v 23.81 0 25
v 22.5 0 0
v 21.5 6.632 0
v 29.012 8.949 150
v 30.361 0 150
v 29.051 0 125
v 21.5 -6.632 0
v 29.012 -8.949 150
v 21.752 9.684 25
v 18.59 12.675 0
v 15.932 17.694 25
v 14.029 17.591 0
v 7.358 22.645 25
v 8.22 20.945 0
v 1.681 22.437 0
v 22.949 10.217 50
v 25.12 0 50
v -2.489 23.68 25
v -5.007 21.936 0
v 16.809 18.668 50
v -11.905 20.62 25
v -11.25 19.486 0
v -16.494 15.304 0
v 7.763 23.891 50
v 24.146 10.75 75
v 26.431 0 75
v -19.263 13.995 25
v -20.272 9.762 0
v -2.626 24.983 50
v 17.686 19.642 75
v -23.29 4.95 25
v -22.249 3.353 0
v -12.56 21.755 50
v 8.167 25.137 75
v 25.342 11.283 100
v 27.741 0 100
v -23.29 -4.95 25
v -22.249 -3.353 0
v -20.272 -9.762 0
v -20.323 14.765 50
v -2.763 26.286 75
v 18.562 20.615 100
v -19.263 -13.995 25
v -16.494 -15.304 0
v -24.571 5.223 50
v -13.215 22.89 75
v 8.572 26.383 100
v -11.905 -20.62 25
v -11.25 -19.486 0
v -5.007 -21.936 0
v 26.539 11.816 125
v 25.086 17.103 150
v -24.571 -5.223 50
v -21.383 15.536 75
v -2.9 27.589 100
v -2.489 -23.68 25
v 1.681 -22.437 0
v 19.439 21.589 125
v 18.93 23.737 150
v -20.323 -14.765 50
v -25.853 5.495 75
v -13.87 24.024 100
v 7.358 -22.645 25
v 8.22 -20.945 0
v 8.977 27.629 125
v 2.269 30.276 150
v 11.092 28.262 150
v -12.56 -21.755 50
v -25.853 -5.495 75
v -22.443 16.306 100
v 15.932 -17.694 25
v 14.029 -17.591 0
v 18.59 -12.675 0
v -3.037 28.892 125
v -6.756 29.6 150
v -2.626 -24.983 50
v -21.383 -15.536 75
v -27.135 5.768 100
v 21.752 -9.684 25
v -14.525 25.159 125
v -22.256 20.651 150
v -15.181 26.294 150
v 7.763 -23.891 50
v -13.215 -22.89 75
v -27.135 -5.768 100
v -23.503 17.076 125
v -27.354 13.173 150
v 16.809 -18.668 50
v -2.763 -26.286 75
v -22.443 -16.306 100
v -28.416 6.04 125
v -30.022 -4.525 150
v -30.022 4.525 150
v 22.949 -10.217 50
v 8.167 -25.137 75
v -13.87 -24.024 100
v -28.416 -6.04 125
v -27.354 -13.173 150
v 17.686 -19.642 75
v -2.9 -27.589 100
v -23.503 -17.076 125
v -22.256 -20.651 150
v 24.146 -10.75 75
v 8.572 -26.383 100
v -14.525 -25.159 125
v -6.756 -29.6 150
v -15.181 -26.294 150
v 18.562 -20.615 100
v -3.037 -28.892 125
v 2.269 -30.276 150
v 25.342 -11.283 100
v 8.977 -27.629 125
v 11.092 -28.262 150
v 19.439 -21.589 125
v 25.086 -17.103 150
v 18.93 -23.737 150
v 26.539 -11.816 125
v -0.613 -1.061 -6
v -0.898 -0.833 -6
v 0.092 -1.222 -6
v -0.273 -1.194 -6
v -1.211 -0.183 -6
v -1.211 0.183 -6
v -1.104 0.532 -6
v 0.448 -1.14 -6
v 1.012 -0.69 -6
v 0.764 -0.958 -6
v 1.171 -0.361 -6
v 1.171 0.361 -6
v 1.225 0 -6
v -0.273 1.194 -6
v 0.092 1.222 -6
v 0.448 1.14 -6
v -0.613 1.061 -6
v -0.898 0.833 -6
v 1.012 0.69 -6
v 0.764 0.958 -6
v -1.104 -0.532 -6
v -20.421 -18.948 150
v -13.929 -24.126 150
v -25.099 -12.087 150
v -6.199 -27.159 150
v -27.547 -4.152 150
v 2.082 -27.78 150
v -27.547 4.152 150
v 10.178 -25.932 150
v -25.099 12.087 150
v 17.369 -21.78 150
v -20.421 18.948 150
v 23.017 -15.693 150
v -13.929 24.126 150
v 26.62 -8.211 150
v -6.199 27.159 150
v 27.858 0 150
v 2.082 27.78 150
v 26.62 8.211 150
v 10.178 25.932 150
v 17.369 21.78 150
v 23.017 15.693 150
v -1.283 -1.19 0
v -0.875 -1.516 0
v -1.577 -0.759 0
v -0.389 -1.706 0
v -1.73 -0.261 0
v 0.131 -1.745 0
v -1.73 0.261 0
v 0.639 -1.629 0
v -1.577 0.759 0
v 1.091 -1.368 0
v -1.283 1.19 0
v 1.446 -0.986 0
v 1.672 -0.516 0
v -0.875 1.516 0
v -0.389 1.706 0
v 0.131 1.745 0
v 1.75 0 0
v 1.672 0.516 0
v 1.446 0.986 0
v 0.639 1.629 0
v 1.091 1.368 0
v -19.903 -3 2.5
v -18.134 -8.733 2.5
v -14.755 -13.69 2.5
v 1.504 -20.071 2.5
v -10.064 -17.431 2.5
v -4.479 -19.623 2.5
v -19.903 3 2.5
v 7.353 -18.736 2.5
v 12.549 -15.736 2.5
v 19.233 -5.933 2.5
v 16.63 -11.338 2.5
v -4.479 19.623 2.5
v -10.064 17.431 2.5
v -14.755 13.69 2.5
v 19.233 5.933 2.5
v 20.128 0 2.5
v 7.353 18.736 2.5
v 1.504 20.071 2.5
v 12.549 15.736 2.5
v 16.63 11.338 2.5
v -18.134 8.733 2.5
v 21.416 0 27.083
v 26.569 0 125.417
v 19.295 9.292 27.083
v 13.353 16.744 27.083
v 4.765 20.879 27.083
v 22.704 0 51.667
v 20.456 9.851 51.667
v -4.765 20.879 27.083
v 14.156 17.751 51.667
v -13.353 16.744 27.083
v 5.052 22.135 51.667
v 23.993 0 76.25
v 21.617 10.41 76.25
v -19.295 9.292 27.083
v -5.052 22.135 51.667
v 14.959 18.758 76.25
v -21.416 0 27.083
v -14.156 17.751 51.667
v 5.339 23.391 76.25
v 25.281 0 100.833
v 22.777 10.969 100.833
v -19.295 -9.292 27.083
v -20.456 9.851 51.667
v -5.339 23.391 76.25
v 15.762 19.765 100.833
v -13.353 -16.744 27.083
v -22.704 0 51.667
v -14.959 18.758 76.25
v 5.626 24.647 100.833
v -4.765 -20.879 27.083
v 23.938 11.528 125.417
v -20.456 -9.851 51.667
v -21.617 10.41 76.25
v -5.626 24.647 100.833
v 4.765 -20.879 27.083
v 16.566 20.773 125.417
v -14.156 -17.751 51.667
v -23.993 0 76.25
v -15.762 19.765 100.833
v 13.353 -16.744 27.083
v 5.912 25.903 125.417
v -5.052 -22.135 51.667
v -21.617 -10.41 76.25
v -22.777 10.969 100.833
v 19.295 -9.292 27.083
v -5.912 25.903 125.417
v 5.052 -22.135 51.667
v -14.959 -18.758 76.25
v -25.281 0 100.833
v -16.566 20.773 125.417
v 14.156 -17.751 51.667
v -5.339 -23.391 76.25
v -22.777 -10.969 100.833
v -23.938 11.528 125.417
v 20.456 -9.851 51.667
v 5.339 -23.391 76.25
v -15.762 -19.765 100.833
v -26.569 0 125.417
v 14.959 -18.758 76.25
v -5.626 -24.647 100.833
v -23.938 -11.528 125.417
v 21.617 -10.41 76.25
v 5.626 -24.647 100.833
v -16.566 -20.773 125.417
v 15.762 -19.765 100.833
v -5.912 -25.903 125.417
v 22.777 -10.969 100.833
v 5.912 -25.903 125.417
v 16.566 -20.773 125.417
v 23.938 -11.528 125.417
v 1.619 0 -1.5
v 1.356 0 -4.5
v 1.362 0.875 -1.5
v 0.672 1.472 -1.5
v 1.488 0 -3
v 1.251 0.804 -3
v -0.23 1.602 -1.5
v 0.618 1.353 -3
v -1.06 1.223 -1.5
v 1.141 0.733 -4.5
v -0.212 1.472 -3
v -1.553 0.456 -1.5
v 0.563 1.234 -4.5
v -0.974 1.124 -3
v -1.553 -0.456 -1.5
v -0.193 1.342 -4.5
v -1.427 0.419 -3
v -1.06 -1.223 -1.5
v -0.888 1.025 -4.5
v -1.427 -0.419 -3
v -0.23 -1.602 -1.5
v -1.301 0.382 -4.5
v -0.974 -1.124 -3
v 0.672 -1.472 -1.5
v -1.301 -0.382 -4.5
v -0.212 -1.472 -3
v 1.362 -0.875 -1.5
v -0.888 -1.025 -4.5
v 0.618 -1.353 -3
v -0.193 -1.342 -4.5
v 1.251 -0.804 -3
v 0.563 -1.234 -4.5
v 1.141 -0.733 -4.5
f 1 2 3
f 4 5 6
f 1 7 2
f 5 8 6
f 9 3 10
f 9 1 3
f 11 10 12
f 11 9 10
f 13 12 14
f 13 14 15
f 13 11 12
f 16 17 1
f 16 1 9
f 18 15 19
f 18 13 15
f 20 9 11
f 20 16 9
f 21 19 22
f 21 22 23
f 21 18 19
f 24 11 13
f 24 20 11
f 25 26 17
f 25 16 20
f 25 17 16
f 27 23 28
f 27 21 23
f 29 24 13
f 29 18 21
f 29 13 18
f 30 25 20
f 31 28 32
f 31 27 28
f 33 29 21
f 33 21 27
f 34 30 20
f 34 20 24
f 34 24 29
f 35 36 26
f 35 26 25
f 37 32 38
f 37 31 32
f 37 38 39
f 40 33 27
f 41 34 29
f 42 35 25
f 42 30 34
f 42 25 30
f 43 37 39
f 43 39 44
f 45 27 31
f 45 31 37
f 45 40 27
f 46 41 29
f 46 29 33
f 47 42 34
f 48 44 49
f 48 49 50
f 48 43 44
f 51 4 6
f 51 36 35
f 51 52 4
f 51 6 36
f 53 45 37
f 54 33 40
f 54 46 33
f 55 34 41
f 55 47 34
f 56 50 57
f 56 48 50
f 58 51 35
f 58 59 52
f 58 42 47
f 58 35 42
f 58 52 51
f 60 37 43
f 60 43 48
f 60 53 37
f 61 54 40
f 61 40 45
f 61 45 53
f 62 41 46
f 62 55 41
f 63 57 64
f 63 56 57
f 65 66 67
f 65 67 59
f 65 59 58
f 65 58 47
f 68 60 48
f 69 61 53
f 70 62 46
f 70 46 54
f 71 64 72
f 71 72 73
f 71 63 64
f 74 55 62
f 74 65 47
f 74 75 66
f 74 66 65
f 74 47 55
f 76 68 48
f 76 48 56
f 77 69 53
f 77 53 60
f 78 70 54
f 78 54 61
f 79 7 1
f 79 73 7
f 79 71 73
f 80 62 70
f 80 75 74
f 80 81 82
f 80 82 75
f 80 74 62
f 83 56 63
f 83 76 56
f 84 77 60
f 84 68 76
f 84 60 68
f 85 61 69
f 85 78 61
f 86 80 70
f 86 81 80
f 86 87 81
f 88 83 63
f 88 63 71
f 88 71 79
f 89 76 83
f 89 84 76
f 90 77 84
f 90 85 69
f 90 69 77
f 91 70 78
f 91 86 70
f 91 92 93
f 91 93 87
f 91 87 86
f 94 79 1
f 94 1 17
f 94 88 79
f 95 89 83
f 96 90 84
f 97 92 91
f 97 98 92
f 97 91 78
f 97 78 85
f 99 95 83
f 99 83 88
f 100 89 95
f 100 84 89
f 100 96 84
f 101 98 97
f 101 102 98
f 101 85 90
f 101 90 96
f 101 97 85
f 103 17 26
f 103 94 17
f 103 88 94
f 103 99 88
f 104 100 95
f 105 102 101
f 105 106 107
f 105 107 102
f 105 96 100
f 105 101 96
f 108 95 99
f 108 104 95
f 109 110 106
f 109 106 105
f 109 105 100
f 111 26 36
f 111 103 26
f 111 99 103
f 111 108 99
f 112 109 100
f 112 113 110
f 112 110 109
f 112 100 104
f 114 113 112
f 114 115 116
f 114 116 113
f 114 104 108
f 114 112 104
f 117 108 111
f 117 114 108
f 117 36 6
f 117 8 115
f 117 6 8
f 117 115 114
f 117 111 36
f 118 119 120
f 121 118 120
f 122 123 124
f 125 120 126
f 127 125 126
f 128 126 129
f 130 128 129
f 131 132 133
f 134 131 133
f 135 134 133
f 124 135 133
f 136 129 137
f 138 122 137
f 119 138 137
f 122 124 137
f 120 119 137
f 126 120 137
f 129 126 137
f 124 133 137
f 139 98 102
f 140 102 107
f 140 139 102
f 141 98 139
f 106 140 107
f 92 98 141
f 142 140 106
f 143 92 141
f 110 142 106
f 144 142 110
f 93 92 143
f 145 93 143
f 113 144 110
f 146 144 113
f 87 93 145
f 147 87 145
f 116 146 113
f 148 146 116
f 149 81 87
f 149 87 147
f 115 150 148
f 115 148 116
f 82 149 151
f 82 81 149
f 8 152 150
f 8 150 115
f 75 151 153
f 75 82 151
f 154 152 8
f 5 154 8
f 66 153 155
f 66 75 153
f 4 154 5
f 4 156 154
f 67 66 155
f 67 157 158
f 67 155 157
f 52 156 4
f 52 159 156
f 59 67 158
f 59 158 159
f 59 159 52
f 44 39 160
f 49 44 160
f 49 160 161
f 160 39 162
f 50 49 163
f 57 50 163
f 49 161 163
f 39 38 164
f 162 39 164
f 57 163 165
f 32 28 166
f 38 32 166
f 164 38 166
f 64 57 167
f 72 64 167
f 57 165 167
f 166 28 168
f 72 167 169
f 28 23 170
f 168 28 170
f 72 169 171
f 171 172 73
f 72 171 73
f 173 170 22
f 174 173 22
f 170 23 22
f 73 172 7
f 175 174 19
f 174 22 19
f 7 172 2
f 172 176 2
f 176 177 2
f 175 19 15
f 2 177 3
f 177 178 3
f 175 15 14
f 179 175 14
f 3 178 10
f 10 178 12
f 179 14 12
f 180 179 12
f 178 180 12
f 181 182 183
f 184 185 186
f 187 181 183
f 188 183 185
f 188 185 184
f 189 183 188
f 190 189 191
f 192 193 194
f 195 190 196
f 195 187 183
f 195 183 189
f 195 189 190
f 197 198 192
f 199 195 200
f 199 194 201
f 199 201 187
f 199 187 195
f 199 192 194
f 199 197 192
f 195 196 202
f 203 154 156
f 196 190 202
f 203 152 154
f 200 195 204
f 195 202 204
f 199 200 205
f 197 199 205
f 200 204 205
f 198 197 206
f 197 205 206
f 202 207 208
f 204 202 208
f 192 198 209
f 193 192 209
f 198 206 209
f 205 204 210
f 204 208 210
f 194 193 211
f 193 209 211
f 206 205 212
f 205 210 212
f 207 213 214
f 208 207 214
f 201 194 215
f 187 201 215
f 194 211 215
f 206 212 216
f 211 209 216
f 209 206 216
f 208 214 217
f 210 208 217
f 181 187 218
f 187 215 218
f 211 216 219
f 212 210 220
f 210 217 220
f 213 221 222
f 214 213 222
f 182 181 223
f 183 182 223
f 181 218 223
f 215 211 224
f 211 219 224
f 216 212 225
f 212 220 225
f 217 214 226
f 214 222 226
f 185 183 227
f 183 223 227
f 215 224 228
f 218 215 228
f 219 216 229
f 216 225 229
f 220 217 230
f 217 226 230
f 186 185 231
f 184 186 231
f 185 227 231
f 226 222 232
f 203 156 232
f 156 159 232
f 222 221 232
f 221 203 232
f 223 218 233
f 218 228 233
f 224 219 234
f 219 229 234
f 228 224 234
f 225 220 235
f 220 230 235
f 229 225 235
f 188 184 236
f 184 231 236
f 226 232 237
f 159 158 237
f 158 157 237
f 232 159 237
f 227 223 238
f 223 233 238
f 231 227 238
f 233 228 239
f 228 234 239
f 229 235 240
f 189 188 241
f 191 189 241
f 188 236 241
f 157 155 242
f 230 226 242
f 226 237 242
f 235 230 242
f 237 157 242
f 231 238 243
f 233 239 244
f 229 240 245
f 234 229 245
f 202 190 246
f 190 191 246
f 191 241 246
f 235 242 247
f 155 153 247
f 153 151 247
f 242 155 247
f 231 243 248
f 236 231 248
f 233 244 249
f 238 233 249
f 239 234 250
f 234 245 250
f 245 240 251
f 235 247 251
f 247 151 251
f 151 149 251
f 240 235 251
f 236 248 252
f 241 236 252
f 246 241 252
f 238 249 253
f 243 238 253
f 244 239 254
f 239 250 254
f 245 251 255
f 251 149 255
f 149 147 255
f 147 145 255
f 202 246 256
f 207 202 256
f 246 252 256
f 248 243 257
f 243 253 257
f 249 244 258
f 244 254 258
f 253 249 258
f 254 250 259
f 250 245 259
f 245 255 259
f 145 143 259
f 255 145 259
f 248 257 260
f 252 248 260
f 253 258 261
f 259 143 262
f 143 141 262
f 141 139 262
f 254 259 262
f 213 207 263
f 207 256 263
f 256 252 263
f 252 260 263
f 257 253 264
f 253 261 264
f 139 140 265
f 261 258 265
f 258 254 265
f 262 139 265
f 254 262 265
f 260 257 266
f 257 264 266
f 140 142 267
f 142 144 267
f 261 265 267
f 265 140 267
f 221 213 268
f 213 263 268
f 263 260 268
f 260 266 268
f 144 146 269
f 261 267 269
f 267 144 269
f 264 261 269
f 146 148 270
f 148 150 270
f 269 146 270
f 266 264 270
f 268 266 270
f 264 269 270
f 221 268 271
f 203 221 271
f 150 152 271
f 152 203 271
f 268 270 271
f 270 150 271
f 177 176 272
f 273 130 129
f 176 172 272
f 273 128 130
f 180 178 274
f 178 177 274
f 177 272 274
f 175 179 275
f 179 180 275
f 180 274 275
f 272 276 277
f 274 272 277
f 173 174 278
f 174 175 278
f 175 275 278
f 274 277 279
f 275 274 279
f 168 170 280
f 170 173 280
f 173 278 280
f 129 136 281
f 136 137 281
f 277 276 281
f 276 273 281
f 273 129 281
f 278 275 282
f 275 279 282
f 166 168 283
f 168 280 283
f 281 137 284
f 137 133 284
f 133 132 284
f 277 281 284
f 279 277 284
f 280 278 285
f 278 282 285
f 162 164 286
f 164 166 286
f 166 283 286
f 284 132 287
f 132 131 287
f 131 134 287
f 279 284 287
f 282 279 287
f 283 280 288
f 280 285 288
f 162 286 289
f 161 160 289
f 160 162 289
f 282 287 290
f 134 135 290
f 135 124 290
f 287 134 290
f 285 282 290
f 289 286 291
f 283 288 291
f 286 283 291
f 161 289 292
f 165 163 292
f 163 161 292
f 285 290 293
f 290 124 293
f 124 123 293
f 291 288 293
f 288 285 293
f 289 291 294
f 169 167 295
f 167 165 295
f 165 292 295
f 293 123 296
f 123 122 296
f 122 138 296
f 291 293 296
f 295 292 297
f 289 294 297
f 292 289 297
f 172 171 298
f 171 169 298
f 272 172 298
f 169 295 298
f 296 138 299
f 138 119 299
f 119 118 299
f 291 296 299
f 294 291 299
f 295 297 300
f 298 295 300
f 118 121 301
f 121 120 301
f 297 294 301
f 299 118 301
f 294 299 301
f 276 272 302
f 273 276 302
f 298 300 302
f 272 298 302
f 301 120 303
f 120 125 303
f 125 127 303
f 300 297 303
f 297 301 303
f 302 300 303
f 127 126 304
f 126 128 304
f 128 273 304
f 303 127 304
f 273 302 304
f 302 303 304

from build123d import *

# Parameters (mm, degrees)
F0_R     = 22.5
F1_DEPTH = 150
F1_TAPER = -3
F2_T     = -2.5
F3_R     = 1.75
F4_DEPTH = 6
F4_TAPER = 5


with BuildPart() as f1:
    # F0 (on Top) → F1 (new body)
    with BuildSketch(Plane.XY):
        Circle(F0_R)
    extrude(amount=F1_DEPTH, taper=F1_TAPER)

    # F2
    f2_openings = [f1.faces().sort_by_distance(p)[0] for p in [
        (0, 0, 150),
    ]]
    offset(amount=F2_T, openings=f2_openings, kind=Kind.INTERSECTION)

    # F3 (on Top) → F4 (join)
    with BuildSketch(Plane.XY):
        Circle(F3_R)
    extrude(amount=-F4_DEPTH, taper=F4_TAPER)


solid = f1.part
